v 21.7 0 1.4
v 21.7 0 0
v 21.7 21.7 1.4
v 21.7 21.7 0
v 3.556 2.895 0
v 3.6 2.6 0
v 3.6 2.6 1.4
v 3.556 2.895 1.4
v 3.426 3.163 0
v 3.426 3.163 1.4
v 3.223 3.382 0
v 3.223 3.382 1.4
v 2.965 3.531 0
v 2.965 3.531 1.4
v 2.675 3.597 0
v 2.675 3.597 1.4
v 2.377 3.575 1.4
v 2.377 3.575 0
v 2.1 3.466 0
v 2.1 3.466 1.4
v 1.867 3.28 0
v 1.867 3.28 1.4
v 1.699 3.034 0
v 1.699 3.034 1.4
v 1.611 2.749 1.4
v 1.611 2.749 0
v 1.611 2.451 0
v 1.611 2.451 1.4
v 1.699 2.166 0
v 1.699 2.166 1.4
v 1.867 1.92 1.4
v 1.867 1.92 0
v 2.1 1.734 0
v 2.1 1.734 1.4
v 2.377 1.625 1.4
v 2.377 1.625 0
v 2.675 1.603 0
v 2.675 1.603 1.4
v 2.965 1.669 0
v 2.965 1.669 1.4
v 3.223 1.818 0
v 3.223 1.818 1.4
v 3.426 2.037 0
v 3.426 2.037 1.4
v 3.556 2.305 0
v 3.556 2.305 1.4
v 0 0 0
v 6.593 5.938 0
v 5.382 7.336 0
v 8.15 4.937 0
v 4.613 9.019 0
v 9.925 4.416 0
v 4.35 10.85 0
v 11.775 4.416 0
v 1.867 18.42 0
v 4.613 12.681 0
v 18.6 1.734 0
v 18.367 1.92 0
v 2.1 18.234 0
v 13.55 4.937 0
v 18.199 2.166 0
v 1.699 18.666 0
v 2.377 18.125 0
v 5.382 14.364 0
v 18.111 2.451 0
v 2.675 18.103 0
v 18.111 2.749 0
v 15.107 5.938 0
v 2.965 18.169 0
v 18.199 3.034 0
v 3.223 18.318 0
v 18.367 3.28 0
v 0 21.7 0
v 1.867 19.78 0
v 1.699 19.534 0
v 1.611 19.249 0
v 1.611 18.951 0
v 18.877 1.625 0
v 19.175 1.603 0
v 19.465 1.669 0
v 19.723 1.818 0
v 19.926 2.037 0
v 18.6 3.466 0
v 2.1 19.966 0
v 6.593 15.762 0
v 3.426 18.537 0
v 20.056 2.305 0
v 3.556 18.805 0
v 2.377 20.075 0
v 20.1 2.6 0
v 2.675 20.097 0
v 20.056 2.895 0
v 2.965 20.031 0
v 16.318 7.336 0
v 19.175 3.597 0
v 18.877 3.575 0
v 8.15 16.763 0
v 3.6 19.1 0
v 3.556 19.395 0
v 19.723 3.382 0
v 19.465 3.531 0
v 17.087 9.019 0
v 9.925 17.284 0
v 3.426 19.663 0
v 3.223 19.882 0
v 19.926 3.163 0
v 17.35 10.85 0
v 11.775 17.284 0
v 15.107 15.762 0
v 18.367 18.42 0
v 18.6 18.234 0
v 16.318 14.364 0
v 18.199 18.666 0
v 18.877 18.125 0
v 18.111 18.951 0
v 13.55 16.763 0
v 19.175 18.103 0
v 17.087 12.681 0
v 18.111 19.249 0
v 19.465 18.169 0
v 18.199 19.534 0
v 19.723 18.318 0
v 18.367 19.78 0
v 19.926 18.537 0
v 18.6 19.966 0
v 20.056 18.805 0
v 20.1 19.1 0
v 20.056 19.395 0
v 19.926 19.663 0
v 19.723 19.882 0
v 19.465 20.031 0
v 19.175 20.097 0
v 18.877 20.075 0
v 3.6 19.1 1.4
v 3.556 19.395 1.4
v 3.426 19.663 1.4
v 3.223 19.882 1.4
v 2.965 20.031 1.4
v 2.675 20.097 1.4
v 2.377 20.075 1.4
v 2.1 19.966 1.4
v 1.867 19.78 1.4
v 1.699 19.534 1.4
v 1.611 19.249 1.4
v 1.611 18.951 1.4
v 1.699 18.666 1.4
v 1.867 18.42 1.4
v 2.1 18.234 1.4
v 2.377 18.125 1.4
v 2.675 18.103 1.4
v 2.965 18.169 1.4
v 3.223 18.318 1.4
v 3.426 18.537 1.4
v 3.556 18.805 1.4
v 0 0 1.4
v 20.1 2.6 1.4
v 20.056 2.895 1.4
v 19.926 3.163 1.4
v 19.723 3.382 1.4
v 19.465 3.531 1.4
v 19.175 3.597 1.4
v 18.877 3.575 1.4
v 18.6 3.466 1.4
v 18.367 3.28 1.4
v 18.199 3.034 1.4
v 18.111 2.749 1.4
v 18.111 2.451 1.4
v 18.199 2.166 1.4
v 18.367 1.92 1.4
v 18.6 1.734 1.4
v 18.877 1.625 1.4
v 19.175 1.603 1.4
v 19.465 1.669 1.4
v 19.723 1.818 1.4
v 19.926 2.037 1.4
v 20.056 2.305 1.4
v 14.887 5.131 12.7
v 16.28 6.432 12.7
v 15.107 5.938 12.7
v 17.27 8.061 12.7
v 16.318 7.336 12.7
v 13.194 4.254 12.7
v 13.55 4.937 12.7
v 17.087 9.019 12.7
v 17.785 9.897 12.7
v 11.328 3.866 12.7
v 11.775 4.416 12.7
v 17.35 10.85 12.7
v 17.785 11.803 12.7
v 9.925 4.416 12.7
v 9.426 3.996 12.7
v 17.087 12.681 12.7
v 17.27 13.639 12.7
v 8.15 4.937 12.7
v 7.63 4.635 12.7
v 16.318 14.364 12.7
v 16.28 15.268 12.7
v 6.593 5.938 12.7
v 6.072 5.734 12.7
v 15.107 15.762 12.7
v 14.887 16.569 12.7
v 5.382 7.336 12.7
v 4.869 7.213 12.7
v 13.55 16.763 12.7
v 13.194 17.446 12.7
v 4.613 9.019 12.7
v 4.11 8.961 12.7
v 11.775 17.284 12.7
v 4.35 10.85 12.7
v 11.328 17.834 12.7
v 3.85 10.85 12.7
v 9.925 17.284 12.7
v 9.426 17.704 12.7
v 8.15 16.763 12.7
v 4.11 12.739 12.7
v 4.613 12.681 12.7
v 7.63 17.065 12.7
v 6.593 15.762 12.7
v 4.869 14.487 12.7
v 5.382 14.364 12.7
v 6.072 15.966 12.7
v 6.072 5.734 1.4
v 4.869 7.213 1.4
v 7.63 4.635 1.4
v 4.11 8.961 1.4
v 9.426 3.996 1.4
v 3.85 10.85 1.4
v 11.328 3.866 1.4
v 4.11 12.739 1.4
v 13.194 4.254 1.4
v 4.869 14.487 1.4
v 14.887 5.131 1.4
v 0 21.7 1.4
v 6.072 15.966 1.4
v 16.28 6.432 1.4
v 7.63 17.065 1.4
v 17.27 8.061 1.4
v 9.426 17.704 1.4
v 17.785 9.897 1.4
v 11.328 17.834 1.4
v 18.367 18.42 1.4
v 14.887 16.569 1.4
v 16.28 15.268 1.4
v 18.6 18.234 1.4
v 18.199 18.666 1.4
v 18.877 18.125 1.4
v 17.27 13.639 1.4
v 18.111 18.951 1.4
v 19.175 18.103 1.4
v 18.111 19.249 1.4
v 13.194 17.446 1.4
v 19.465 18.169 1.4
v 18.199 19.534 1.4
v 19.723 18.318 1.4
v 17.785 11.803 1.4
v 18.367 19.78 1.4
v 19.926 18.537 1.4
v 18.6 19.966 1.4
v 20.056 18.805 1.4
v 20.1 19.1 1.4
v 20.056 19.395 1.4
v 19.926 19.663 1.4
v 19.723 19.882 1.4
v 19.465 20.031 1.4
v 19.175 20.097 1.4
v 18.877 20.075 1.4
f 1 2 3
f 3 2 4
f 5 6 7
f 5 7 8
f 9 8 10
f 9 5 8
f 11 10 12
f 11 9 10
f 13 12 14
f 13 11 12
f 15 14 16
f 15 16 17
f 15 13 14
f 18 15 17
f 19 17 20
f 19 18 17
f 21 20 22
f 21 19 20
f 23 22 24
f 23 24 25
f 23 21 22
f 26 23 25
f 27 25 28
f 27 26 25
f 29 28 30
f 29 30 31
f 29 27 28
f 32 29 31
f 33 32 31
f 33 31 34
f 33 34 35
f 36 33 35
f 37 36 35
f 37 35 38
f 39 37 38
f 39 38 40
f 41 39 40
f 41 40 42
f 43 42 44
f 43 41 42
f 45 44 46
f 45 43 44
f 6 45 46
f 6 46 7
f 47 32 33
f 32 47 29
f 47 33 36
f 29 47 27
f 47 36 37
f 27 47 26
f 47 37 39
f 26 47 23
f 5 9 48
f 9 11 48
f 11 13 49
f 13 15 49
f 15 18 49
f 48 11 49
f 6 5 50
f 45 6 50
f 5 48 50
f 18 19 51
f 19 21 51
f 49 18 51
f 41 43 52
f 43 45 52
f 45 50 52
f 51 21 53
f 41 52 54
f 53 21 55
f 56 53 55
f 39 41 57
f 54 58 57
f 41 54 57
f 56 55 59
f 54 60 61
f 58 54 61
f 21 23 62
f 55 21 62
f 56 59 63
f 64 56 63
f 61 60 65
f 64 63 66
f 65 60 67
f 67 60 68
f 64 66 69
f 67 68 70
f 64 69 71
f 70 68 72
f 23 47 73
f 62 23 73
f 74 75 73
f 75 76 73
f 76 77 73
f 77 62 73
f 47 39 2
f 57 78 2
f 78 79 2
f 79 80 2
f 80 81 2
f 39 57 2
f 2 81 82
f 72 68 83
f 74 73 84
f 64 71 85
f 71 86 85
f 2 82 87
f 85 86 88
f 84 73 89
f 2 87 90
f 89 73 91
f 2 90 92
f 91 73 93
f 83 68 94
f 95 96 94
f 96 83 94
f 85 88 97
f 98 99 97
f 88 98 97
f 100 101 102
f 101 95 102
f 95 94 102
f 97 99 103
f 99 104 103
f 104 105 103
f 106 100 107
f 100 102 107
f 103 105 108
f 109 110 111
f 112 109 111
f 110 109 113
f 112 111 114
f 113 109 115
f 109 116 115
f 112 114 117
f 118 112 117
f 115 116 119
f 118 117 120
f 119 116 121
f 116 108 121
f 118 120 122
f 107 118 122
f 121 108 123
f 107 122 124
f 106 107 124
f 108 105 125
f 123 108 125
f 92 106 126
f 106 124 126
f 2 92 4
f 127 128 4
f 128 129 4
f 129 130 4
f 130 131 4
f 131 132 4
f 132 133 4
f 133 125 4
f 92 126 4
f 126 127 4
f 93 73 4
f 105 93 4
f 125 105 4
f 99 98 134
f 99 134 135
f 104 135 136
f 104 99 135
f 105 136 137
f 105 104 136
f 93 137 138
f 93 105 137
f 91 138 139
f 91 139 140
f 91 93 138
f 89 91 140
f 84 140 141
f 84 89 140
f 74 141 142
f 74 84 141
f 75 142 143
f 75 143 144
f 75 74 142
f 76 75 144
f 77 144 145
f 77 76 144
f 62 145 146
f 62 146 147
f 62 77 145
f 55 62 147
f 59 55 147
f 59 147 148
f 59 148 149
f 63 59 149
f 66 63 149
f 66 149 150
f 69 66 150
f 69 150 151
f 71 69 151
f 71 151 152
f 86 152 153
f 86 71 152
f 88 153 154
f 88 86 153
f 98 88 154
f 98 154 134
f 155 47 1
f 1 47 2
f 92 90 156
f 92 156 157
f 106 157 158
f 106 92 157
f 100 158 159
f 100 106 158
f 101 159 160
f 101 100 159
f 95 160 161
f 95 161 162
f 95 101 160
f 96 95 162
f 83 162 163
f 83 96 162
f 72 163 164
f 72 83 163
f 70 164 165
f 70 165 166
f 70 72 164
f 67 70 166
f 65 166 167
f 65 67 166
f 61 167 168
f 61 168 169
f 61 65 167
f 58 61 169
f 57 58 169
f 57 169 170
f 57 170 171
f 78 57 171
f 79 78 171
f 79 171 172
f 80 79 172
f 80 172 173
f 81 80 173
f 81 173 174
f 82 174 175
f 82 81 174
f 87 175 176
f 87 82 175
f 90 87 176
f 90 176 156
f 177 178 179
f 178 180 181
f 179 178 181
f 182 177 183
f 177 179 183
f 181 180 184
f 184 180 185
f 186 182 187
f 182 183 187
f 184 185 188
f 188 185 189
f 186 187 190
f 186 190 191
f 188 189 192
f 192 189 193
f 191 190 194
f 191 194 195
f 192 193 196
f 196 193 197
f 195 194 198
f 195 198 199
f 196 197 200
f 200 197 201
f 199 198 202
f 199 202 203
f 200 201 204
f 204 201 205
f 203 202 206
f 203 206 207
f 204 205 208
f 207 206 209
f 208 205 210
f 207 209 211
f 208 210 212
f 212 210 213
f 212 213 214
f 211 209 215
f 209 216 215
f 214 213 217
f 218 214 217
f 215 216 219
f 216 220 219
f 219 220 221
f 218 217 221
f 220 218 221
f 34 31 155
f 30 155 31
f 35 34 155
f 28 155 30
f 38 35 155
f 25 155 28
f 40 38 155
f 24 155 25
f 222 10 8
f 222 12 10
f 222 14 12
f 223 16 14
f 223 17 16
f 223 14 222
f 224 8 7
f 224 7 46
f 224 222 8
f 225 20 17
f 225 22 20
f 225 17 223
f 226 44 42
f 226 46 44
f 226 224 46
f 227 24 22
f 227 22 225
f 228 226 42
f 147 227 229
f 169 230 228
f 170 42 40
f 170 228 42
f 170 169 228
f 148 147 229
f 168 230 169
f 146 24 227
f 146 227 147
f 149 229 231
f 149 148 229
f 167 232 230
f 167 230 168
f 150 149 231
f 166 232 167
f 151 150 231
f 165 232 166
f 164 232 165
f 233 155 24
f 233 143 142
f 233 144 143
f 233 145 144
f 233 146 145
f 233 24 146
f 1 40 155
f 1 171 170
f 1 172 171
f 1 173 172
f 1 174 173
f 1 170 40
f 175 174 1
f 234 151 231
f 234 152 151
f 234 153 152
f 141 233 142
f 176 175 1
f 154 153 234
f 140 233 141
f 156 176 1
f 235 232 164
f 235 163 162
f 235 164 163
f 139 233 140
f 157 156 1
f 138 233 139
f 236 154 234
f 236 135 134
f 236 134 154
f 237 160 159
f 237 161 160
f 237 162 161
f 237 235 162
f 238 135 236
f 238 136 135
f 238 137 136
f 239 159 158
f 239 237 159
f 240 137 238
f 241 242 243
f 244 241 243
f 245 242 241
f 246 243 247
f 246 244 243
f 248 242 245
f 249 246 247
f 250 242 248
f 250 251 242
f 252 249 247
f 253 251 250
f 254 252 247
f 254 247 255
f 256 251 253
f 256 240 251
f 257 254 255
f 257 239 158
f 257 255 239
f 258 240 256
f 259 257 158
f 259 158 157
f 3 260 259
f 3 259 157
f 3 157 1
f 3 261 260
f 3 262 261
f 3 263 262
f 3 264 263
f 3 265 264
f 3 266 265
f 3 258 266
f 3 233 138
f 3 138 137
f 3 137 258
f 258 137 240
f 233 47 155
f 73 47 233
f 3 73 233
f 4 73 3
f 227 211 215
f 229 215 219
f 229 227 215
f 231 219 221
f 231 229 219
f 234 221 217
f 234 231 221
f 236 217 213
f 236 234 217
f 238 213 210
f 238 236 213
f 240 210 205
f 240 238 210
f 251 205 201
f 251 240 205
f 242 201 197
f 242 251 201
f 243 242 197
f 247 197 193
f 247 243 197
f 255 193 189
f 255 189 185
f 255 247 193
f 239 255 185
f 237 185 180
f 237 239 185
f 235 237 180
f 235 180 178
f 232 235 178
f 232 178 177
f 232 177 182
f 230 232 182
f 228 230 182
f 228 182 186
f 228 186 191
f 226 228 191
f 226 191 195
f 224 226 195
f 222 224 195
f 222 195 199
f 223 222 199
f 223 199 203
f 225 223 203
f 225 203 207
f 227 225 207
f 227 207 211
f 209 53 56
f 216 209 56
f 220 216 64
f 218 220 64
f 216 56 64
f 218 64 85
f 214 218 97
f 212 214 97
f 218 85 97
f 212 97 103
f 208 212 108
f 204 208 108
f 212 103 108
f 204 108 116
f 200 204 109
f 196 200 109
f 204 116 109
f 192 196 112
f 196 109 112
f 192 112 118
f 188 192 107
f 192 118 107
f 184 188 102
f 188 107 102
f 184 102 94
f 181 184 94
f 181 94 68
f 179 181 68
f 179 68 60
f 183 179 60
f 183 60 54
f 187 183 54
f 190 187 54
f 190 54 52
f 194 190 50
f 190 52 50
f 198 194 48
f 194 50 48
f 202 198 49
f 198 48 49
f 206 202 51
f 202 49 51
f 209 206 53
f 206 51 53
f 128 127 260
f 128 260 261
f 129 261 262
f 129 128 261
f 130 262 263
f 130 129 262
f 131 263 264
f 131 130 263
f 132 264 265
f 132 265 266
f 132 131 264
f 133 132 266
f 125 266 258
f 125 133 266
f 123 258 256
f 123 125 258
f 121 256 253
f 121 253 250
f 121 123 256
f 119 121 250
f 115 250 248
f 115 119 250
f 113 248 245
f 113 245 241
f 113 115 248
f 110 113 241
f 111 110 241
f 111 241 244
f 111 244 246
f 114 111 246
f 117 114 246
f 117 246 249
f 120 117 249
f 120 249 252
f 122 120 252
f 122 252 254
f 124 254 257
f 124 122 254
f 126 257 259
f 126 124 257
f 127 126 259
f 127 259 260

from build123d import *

# Parameters (mm, degrees)
SKETCH_1_W        = 21.7
SKETCH_1_H        = 21.7
SKETCH_1_R        = 1
SKETCH_1_R_2      = 7
EXTRUDE_1_DEPTH   = 1.4
SKETCH_2_R        = 7
SKETCH_2_R_2      = 6.5
EXTRUDE_1_2_DEPTH = 12.7


with BuildPart() as part:
    # Эскиз1 → Extrude 1 (new body)
    with BuildSketch(Plane.XY):
        with Locations((10.85, 10.85)):
            Rectangle(SKETCH_1_W, SKETCH_1_H)
        with Locations((2.6, 19.1)):
            Circle(SKETCH_1_R, mode=Mode.SUBTRACT)
        with Locations((10.85, 10.85)):
            Circle(SKETCH_1_R_2, mode=Mode.SUBTRACT)
        with Locations((19.1, 19.1)):
            Circle(SKETCH_1_R, mode=Mode.SUBTRACT)
        with Locations((19.1, 2.6)):
            Circle(SKETCH_1_R, mode=Mode.SUBTRACT)
        with Locations((2.6, 2.6)):
            Circle(SKETCH_1_R, mode=Mode.SUBTRACT)
    extrude(amount=EXTRUDE_1_DEPTH)

    # Эскиз2 → Extrude 1 2 (add)
    with BuildSketch(Plane(origin=(0, 0, 0), x_dir=(-1, 0, 0), z_dir=(0, 0, -1))):
        with Locations((-10.85, 10.85)):
            Circle(SKETCH_2_R)
        with Locations((-10.85, 10.85)):
            Circle(SKETCH_2_R_2, mode=Mode.SUBTRACT)
    extrude(amount=-EXTRUDE_1_2_DEPTH)


solid = part.part
